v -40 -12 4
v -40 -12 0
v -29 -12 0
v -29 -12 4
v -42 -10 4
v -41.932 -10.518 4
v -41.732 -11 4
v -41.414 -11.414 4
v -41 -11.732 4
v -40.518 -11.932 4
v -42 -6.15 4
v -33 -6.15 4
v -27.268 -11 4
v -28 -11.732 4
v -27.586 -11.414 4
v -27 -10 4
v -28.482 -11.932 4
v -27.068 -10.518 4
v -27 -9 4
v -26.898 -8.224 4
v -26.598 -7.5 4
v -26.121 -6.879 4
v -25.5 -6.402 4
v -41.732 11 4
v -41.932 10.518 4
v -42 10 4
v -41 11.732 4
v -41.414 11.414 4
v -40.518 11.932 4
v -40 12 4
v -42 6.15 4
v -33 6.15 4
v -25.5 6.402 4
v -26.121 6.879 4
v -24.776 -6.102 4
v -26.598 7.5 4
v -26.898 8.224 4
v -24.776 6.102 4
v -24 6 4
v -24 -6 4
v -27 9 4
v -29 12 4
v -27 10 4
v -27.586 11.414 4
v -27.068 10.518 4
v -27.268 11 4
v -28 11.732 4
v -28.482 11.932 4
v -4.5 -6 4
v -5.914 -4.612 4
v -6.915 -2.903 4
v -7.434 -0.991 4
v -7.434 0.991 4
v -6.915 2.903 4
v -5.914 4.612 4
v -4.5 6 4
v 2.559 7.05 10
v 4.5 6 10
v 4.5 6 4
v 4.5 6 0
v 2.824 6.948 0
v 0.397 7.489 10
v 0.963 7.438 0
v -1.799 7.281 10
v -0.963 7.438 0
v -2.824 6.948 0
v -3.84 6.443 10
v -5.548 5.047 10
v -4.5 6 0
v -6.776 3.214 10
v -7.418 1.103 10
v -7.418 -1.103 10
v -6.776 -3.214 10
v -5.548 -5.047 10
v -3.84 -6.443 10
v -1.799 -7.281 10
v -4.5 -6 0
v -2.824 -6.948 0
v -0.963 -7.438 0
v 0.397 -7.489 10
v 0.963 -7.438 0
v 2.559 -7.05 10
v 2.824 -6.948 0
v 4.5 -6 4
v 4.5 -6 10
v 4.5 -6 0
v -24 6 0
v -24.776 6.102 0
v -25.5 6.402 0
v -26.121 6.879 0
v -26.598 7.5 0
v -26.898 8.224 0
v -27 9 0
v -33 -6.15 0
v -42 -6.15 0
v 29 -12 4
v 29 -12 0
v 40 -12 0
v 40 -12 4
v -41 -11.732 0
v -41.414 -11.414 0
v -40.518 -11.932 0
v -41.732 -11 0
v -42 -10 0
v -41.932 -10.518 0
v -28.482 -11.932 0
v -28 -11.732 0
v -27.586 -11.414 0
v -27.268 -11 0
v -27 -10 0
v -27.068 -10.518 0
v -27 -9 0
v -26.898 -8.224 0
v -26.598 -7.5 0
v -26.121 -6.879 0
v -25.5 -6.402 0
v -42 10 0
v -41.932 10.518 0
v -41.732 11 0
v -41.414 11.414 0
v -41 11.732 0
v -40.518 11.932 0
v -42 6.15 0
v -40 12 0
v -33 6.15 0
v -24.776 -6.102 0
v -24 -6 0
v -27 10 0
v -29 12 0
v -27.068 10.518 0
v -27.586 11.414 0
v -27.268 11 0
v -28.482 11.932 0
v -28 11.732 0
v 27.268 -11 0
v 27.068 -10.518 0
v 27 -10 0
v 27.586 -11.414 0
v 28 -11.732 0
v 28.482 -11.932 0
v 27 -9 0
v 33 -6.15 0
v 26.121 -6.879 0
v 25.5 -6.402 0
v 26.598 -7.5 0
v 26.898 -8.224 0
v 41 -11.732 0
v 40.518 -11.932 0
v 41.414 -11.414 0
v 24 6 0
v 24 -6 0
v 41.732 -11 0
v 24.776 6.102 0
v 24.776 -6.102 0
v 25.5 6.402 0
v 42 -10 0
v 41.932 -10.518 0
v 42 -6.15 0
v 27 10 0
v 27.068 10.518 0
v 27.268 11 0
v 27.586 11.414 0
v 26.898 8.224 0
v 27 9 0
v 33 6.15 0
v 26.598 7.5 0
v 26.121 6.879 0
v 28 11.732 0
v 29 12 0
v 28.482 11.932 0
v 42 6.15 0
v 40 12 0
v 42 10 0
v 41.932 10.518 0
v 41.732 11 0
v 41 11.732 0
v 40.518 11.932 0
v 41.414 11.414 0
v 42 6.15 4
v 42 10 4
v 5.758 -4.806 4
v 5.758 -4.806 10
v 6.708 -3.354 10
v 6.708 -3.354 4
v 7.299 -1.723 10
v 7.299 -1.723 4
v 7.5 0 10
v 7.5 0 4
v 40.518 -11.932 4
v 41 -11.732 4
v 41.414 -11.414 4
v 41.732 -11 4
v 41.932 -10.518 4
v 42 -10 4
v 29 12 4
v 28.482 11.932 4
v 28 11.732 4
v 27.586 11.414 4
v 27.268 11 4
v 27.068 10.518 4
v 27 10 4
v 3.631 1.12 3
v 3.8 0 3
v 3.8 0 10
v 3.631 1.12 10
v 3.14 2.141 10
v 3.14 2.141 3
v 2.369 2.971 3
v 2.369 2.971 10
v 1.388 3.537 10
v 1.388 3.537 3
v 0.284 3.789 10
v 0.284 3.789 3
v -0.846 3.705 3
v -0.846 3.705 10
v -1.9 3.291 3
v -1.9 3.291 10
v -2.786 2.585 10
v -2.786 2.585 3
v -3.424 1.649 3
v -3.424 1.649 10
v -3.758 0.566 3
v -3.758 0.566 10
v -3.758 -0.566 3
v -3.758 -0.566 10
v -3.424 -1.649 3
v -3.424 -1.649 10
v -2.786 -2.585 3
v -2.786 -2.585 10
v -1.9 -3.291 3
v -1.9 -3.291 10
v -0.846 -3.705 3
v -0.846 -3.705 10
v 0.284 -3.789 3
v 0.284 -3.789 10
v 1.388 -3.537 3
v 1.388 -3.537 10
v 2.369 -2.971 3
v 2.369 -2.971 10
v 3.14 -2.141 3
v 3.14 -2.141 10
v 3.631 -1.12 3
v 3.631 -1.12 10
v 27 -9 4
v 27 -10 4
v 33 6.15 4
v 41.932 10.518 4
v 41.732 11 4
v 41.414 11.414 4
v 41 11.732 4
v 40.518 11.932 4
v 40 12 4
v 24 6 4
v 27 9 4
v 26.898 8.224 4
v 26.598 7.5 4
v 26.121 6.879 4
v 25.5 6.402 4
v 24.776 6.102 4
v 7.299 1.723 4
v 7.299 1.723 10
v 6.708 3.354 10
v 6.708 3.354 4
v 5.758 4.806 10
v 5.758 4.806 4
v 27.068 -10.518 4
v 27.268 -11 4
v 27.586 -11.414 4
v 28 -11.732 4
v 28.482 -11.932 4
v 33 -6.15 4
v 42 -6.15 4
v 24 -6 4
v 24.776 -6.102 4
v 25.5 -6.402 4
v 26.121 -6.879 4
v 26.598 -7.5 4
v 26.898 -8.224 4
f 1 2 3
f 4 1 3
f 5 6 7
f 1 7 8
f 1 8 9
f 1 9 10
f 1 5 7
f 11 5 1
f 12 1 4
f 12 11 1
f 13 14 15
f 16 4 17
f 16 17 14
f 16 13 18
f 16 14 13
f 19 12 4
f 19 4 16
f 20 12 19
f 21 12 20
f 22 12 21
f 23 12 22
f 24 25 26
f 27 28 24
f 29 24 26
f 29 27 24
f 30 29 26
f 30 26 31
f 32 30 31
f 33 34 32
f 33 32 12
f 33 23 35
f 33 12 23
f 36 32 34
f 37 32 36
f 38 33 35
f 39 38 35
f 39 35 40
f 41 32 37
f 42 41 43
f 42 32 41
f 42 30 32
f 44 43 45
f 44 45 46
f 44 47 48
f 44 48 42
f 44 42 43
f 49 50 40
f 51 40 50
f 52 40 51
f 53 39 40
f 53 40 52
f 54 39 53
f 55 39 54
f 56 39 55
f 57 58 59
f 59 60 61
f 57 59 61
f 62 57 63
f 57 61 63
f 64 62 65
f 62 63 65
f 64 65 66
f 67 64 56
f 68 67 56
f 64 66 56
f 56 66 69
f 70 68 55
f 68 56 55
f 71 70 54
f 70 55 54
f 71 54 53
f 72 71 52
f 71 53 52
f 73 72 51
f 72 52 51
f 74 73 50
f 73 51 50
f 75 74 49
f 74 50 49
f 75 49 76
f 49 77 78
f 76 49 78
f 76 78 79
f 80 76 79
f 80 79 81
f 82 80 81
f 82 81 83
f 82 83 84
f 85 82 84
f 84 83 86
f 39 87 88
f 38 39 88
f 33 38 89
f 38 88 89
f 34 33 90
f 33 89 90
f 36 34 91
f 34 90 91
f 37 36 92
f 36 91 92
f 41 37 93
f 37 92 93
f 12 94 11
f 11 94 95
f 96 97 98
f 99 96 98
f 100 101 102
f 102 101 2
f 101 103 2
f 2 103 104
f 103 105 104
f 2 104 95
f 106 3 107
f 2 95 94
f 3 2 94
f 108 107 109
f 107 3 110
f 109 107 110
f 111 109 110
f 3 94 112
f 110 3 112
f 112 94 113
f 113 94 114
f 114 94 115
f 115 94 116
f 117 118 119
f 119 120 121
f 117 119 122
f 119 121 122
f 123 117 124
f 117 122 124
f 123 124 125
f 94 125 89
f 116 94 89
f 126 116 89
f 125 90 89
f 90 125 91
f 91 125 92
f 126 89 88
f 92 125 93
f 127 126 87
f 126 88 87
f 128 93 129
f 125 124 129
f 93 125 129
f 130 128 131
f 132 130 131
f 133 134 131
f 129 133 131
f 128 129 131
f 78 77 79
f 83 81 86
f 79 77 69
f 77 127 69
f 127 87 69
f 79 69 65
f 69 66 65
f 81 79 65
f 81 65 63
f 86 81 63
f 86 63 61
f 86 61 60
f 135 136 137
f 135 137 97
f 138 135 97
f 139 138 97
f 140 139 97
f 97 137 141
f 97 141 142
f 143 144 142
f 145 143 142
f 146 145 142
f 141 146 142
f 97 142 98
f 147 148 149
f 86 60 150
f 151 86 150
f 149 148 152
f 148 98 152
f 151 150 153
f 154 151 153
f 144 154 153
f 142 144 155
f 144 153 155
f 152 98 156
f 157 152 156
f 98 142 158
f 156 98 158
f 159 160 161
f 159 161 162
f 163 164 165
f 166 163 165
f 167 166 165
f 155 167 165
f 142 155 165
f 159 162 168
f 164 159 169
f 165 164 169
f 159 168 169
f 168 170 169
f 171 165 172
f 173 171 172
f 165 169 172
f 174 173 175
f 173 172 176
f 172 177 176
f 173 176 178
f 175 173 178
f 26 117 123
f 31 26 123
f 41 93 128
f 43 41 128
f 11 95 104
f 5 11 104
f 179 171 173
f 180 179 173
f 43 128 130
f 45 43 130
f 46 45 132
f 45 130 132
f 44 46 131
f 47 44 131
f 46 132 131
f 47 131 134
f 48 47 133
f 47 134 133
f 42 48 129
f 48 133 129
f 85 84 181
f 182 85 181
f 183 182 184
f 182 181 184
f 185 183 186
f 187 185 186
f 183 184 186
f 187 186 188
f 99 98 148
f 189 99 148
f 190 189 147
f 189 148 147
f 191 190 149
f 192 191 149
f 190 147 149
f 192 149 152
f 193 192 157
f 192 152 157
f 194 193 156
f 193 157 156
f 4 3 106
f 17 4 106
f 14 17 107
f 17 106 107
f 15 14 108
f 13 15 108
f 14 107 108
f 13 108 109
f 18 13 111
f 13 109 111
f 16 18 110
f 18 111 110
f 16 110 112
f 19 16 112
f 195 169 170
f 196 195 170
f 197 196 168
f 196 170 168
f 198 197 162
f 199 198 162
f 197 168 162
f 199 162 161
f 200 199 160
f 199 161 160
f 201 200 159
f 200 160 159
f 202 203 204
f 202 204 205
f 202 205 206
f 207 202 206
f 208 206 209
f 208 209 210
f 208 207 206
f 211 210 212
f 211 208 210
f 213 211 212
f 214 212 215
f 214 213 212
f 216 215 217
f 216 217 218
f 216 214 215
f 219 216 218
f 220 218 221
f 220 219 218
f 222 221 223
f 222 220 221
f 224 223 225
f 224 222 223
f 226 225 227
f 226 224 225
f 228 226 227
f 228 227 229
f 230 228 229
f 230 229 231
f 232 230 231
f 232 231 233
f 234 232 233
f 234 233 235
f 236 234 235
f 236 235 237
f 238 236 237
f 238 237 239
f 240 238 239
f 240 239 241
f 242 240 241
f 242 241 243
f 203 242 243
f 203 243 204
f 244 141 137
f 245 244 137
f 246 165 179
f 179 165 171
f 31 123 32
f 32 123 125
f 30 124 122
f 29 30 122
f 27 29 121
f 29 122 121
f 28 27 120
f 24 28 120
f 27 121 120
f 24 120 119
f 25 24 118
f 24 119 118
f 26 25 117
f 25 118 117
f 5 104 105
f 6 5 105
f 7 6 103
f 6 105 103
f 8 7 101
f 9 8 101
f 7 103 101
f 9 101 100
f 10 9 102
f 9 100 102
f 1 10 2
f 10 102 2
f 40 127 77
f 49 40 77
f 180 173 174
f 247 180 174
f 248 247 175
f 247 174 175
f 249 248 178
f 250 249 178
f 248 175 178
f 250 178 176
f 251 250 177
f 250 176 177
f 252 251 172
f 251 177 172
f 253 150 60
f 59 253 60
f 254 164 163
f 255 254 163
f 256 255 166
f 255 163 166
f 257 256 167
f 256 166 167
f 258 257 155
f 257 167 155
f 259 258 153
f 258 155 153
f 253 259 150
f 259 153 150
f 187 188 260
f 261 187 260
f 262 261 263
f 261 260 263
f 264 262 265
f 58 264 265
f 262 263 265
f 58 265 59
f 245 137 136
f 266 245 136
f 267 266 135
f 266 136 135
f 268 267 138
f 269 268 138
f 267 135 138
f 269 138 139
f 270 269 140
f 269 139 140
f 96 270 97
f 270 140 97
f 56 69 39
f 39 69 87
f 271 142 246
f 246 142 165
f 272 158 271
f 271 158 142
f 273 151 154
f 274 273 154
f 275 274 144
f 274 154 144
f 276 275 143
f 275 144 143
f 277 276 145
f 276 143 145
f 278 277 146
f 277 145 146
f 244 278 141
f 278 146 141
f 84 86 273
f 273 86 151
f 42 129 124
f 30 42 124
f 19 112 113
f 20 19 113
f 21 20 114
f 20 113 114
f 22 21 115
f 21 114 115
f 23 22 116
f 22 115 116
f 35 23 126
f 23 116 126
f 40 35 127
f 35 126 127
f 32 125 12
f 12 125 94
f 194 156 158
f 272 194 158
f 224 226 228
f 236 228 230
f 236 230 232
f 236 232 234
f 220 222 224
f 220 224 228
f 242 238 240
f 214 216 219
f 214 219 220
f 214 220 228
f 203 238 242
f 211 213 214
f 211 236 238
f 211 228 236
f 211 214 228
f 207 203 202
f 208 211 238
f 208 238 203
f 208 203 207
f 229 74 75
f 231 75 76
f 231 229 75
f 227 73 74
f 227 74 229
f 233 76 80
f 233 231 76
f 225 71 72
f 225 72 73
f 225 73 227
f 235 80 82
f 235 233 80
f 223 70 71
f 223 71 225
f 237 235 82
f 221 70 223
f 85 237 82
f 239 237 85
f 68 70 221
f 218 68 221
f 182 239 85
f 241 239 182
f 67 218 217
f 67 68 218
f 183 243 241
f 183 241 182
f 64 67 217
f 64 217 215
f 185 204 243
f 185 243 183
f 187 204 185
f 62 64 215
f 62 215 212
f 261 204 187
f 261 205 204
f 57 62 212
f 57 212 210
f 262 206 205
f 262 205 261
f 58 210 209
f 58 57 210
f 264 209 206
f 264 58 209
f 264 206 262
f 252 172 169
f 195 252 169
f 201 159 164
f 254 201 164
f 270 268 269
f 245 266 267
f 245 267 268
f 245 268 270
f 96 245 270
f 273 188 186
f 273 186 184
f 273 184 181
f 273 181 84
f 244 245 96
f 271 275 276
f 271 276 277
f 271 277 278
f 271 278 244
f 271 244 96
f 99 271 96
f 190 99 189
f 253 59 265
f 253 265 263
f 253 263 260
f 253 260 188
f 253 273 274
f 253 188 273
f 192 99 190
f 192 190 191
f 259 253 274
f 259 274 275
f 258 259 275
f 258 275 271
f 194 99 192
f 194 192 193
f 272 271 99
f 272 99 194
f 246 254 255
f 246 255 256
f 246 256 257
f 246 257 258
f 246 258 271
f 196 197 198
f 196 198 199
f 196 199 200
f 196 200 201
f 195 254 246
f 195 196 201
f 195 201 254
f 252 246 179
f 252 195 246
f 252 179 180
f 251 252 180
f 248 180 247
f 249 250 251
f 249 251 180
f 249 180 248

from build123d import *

# Parameters (mm, degrees)
F0_R     = 3.8
F1_DEPTH = 10
F2_DEPTH = 4
F3_DEPTH = 3


with BuildPart() as f1:
    # F0 (on Top) → F1 (new body)
    with BuildSketch(Plane.XY):
        with BuildLine():
            ThreePointArc((7.5, 0), (6.7082039325, 3.3541019662), (4.5, 6))
            Line((4.5, 6), (-4.5, 6))
            ThreePointArc((-4.5, 6), (-7.5, 0), (-4.5, -6))
            Line((-4.5, -6), (4.5, -6))
            ThreePointArc((4.5, -6), (6.7082039325, -3.3541019662), (7.5, 0))
        make_face()
        Circle(F0_R, mode=Mode.SUBTRACT)
        with BuildLine():
            Line((4.5, -6), (-4.5, -6))
            ThreePointArc((-4.5, -6), (0, -7.5), (4.5, -6))
        make_face()
        with BuildLine():
            Line((-4.5, 6), (4.5, 6))
            ThreePointArc((4.5, 6), (0, 7.5), (-4.5, 6))
        make_face()
    extrude(amount=F1_DEPTH)

    # F0 (on Top) → F2 (join)
    with BuildSketch(Plane.XY):
        with BuildLine():
            ThreePointArc((-4.5, -6), (-7.5, 0), (-4.5, 6))
            Line((-4.5, 6), (-24, 6))
            ThreePointArc((-24, 6), (-26.1213203436, 6.8786796564), (-27, 9))
            Line((-27, 9), (-27, 10))
            ThreePointArc((-27, 10), (-27.5857864376, 11.4142135624), (-29, 12))
            Line((-29, 12), (-40, 12))
            ThreePointArc((-40, 12), (-41.4142135624, 11.4142135624), (-42, 10))
            Line((-42, 10), (-42, 6.15))
            Line((-42, 6.15), (-33, 6.15))
            Line((-33, 6.15), (-33, -6.15))
            Line((-33, -6.15), (-42, -6.15))
            Line((-42, -6.15), (-42, -10))
            ThreePointArc((-42, -10), (-41.4142135624, -11.4142135624), (-40, -12))
            Line((-40, -12), (-29, -12))
            ThreePointArc((-29, -12), (-27.5857864376, -11.4142135624), (-27, -10))
            Line((-27, -10), (-27, -9))
            ThreePointArc((-27, -9), (-26.1213203436, -6.8786796564), (-24, -6))
            Line((-24, -6), (-4.5, -6))
        make_face()
        with BuildLine():
            ThreePointArc((27, 9), (26.1213203436, 6.8786796564), (24, 6))
            Line((24, 6), (4.5, 6))
            ThreePointArc((4.5, 6), (6.7082039325, 3.3541019662), (7.5, 0))
            ThreePointArc((7.5, 0), (6.7082039325, -3.3541019662), (4.5, -6))
            Line((4.5, -6), (24, -6))
            ThreePointArc((24, -6), (26.1213203436, -6.8786796564), (27, -9))
            Line((27, -9), (27, -10))
            ThreePointArc((27, -10), (27.5857864376, -11.4142135624), (29, -12))
            Line((29, -12), (40, -12))
            ThreePointArc((40, -12), (41.4142135624, -11.4142135624), (42, -10))
            Line((42, -10), (42, -6.15))
            Line((42, -6.15), (33, -6.15))
            Line((33, -6.15), (33, 6.15))
            Line((33, 6.15), (42, 6.15))
            Line((42, 6.15), (42, 10))
            ThreePointArc((42, 10), (41.4142135624, 11.4142135624), (40, 12))
            Line((40, 12), (29, 12))
            ThreePointArc((29, 12), (27.5857864376, 11.4142135624), (27, 10))
            Line((27, 10), (27, 9))
        make_face()
    extrude(amount=F2_DEPTH)

    # F0 (on Top) → F3 (join)
    with BuildSketch(Plane.XY):
        Circle(F0_R)
    extrude(amount=F3_DEPTH)


solid = f1.part
